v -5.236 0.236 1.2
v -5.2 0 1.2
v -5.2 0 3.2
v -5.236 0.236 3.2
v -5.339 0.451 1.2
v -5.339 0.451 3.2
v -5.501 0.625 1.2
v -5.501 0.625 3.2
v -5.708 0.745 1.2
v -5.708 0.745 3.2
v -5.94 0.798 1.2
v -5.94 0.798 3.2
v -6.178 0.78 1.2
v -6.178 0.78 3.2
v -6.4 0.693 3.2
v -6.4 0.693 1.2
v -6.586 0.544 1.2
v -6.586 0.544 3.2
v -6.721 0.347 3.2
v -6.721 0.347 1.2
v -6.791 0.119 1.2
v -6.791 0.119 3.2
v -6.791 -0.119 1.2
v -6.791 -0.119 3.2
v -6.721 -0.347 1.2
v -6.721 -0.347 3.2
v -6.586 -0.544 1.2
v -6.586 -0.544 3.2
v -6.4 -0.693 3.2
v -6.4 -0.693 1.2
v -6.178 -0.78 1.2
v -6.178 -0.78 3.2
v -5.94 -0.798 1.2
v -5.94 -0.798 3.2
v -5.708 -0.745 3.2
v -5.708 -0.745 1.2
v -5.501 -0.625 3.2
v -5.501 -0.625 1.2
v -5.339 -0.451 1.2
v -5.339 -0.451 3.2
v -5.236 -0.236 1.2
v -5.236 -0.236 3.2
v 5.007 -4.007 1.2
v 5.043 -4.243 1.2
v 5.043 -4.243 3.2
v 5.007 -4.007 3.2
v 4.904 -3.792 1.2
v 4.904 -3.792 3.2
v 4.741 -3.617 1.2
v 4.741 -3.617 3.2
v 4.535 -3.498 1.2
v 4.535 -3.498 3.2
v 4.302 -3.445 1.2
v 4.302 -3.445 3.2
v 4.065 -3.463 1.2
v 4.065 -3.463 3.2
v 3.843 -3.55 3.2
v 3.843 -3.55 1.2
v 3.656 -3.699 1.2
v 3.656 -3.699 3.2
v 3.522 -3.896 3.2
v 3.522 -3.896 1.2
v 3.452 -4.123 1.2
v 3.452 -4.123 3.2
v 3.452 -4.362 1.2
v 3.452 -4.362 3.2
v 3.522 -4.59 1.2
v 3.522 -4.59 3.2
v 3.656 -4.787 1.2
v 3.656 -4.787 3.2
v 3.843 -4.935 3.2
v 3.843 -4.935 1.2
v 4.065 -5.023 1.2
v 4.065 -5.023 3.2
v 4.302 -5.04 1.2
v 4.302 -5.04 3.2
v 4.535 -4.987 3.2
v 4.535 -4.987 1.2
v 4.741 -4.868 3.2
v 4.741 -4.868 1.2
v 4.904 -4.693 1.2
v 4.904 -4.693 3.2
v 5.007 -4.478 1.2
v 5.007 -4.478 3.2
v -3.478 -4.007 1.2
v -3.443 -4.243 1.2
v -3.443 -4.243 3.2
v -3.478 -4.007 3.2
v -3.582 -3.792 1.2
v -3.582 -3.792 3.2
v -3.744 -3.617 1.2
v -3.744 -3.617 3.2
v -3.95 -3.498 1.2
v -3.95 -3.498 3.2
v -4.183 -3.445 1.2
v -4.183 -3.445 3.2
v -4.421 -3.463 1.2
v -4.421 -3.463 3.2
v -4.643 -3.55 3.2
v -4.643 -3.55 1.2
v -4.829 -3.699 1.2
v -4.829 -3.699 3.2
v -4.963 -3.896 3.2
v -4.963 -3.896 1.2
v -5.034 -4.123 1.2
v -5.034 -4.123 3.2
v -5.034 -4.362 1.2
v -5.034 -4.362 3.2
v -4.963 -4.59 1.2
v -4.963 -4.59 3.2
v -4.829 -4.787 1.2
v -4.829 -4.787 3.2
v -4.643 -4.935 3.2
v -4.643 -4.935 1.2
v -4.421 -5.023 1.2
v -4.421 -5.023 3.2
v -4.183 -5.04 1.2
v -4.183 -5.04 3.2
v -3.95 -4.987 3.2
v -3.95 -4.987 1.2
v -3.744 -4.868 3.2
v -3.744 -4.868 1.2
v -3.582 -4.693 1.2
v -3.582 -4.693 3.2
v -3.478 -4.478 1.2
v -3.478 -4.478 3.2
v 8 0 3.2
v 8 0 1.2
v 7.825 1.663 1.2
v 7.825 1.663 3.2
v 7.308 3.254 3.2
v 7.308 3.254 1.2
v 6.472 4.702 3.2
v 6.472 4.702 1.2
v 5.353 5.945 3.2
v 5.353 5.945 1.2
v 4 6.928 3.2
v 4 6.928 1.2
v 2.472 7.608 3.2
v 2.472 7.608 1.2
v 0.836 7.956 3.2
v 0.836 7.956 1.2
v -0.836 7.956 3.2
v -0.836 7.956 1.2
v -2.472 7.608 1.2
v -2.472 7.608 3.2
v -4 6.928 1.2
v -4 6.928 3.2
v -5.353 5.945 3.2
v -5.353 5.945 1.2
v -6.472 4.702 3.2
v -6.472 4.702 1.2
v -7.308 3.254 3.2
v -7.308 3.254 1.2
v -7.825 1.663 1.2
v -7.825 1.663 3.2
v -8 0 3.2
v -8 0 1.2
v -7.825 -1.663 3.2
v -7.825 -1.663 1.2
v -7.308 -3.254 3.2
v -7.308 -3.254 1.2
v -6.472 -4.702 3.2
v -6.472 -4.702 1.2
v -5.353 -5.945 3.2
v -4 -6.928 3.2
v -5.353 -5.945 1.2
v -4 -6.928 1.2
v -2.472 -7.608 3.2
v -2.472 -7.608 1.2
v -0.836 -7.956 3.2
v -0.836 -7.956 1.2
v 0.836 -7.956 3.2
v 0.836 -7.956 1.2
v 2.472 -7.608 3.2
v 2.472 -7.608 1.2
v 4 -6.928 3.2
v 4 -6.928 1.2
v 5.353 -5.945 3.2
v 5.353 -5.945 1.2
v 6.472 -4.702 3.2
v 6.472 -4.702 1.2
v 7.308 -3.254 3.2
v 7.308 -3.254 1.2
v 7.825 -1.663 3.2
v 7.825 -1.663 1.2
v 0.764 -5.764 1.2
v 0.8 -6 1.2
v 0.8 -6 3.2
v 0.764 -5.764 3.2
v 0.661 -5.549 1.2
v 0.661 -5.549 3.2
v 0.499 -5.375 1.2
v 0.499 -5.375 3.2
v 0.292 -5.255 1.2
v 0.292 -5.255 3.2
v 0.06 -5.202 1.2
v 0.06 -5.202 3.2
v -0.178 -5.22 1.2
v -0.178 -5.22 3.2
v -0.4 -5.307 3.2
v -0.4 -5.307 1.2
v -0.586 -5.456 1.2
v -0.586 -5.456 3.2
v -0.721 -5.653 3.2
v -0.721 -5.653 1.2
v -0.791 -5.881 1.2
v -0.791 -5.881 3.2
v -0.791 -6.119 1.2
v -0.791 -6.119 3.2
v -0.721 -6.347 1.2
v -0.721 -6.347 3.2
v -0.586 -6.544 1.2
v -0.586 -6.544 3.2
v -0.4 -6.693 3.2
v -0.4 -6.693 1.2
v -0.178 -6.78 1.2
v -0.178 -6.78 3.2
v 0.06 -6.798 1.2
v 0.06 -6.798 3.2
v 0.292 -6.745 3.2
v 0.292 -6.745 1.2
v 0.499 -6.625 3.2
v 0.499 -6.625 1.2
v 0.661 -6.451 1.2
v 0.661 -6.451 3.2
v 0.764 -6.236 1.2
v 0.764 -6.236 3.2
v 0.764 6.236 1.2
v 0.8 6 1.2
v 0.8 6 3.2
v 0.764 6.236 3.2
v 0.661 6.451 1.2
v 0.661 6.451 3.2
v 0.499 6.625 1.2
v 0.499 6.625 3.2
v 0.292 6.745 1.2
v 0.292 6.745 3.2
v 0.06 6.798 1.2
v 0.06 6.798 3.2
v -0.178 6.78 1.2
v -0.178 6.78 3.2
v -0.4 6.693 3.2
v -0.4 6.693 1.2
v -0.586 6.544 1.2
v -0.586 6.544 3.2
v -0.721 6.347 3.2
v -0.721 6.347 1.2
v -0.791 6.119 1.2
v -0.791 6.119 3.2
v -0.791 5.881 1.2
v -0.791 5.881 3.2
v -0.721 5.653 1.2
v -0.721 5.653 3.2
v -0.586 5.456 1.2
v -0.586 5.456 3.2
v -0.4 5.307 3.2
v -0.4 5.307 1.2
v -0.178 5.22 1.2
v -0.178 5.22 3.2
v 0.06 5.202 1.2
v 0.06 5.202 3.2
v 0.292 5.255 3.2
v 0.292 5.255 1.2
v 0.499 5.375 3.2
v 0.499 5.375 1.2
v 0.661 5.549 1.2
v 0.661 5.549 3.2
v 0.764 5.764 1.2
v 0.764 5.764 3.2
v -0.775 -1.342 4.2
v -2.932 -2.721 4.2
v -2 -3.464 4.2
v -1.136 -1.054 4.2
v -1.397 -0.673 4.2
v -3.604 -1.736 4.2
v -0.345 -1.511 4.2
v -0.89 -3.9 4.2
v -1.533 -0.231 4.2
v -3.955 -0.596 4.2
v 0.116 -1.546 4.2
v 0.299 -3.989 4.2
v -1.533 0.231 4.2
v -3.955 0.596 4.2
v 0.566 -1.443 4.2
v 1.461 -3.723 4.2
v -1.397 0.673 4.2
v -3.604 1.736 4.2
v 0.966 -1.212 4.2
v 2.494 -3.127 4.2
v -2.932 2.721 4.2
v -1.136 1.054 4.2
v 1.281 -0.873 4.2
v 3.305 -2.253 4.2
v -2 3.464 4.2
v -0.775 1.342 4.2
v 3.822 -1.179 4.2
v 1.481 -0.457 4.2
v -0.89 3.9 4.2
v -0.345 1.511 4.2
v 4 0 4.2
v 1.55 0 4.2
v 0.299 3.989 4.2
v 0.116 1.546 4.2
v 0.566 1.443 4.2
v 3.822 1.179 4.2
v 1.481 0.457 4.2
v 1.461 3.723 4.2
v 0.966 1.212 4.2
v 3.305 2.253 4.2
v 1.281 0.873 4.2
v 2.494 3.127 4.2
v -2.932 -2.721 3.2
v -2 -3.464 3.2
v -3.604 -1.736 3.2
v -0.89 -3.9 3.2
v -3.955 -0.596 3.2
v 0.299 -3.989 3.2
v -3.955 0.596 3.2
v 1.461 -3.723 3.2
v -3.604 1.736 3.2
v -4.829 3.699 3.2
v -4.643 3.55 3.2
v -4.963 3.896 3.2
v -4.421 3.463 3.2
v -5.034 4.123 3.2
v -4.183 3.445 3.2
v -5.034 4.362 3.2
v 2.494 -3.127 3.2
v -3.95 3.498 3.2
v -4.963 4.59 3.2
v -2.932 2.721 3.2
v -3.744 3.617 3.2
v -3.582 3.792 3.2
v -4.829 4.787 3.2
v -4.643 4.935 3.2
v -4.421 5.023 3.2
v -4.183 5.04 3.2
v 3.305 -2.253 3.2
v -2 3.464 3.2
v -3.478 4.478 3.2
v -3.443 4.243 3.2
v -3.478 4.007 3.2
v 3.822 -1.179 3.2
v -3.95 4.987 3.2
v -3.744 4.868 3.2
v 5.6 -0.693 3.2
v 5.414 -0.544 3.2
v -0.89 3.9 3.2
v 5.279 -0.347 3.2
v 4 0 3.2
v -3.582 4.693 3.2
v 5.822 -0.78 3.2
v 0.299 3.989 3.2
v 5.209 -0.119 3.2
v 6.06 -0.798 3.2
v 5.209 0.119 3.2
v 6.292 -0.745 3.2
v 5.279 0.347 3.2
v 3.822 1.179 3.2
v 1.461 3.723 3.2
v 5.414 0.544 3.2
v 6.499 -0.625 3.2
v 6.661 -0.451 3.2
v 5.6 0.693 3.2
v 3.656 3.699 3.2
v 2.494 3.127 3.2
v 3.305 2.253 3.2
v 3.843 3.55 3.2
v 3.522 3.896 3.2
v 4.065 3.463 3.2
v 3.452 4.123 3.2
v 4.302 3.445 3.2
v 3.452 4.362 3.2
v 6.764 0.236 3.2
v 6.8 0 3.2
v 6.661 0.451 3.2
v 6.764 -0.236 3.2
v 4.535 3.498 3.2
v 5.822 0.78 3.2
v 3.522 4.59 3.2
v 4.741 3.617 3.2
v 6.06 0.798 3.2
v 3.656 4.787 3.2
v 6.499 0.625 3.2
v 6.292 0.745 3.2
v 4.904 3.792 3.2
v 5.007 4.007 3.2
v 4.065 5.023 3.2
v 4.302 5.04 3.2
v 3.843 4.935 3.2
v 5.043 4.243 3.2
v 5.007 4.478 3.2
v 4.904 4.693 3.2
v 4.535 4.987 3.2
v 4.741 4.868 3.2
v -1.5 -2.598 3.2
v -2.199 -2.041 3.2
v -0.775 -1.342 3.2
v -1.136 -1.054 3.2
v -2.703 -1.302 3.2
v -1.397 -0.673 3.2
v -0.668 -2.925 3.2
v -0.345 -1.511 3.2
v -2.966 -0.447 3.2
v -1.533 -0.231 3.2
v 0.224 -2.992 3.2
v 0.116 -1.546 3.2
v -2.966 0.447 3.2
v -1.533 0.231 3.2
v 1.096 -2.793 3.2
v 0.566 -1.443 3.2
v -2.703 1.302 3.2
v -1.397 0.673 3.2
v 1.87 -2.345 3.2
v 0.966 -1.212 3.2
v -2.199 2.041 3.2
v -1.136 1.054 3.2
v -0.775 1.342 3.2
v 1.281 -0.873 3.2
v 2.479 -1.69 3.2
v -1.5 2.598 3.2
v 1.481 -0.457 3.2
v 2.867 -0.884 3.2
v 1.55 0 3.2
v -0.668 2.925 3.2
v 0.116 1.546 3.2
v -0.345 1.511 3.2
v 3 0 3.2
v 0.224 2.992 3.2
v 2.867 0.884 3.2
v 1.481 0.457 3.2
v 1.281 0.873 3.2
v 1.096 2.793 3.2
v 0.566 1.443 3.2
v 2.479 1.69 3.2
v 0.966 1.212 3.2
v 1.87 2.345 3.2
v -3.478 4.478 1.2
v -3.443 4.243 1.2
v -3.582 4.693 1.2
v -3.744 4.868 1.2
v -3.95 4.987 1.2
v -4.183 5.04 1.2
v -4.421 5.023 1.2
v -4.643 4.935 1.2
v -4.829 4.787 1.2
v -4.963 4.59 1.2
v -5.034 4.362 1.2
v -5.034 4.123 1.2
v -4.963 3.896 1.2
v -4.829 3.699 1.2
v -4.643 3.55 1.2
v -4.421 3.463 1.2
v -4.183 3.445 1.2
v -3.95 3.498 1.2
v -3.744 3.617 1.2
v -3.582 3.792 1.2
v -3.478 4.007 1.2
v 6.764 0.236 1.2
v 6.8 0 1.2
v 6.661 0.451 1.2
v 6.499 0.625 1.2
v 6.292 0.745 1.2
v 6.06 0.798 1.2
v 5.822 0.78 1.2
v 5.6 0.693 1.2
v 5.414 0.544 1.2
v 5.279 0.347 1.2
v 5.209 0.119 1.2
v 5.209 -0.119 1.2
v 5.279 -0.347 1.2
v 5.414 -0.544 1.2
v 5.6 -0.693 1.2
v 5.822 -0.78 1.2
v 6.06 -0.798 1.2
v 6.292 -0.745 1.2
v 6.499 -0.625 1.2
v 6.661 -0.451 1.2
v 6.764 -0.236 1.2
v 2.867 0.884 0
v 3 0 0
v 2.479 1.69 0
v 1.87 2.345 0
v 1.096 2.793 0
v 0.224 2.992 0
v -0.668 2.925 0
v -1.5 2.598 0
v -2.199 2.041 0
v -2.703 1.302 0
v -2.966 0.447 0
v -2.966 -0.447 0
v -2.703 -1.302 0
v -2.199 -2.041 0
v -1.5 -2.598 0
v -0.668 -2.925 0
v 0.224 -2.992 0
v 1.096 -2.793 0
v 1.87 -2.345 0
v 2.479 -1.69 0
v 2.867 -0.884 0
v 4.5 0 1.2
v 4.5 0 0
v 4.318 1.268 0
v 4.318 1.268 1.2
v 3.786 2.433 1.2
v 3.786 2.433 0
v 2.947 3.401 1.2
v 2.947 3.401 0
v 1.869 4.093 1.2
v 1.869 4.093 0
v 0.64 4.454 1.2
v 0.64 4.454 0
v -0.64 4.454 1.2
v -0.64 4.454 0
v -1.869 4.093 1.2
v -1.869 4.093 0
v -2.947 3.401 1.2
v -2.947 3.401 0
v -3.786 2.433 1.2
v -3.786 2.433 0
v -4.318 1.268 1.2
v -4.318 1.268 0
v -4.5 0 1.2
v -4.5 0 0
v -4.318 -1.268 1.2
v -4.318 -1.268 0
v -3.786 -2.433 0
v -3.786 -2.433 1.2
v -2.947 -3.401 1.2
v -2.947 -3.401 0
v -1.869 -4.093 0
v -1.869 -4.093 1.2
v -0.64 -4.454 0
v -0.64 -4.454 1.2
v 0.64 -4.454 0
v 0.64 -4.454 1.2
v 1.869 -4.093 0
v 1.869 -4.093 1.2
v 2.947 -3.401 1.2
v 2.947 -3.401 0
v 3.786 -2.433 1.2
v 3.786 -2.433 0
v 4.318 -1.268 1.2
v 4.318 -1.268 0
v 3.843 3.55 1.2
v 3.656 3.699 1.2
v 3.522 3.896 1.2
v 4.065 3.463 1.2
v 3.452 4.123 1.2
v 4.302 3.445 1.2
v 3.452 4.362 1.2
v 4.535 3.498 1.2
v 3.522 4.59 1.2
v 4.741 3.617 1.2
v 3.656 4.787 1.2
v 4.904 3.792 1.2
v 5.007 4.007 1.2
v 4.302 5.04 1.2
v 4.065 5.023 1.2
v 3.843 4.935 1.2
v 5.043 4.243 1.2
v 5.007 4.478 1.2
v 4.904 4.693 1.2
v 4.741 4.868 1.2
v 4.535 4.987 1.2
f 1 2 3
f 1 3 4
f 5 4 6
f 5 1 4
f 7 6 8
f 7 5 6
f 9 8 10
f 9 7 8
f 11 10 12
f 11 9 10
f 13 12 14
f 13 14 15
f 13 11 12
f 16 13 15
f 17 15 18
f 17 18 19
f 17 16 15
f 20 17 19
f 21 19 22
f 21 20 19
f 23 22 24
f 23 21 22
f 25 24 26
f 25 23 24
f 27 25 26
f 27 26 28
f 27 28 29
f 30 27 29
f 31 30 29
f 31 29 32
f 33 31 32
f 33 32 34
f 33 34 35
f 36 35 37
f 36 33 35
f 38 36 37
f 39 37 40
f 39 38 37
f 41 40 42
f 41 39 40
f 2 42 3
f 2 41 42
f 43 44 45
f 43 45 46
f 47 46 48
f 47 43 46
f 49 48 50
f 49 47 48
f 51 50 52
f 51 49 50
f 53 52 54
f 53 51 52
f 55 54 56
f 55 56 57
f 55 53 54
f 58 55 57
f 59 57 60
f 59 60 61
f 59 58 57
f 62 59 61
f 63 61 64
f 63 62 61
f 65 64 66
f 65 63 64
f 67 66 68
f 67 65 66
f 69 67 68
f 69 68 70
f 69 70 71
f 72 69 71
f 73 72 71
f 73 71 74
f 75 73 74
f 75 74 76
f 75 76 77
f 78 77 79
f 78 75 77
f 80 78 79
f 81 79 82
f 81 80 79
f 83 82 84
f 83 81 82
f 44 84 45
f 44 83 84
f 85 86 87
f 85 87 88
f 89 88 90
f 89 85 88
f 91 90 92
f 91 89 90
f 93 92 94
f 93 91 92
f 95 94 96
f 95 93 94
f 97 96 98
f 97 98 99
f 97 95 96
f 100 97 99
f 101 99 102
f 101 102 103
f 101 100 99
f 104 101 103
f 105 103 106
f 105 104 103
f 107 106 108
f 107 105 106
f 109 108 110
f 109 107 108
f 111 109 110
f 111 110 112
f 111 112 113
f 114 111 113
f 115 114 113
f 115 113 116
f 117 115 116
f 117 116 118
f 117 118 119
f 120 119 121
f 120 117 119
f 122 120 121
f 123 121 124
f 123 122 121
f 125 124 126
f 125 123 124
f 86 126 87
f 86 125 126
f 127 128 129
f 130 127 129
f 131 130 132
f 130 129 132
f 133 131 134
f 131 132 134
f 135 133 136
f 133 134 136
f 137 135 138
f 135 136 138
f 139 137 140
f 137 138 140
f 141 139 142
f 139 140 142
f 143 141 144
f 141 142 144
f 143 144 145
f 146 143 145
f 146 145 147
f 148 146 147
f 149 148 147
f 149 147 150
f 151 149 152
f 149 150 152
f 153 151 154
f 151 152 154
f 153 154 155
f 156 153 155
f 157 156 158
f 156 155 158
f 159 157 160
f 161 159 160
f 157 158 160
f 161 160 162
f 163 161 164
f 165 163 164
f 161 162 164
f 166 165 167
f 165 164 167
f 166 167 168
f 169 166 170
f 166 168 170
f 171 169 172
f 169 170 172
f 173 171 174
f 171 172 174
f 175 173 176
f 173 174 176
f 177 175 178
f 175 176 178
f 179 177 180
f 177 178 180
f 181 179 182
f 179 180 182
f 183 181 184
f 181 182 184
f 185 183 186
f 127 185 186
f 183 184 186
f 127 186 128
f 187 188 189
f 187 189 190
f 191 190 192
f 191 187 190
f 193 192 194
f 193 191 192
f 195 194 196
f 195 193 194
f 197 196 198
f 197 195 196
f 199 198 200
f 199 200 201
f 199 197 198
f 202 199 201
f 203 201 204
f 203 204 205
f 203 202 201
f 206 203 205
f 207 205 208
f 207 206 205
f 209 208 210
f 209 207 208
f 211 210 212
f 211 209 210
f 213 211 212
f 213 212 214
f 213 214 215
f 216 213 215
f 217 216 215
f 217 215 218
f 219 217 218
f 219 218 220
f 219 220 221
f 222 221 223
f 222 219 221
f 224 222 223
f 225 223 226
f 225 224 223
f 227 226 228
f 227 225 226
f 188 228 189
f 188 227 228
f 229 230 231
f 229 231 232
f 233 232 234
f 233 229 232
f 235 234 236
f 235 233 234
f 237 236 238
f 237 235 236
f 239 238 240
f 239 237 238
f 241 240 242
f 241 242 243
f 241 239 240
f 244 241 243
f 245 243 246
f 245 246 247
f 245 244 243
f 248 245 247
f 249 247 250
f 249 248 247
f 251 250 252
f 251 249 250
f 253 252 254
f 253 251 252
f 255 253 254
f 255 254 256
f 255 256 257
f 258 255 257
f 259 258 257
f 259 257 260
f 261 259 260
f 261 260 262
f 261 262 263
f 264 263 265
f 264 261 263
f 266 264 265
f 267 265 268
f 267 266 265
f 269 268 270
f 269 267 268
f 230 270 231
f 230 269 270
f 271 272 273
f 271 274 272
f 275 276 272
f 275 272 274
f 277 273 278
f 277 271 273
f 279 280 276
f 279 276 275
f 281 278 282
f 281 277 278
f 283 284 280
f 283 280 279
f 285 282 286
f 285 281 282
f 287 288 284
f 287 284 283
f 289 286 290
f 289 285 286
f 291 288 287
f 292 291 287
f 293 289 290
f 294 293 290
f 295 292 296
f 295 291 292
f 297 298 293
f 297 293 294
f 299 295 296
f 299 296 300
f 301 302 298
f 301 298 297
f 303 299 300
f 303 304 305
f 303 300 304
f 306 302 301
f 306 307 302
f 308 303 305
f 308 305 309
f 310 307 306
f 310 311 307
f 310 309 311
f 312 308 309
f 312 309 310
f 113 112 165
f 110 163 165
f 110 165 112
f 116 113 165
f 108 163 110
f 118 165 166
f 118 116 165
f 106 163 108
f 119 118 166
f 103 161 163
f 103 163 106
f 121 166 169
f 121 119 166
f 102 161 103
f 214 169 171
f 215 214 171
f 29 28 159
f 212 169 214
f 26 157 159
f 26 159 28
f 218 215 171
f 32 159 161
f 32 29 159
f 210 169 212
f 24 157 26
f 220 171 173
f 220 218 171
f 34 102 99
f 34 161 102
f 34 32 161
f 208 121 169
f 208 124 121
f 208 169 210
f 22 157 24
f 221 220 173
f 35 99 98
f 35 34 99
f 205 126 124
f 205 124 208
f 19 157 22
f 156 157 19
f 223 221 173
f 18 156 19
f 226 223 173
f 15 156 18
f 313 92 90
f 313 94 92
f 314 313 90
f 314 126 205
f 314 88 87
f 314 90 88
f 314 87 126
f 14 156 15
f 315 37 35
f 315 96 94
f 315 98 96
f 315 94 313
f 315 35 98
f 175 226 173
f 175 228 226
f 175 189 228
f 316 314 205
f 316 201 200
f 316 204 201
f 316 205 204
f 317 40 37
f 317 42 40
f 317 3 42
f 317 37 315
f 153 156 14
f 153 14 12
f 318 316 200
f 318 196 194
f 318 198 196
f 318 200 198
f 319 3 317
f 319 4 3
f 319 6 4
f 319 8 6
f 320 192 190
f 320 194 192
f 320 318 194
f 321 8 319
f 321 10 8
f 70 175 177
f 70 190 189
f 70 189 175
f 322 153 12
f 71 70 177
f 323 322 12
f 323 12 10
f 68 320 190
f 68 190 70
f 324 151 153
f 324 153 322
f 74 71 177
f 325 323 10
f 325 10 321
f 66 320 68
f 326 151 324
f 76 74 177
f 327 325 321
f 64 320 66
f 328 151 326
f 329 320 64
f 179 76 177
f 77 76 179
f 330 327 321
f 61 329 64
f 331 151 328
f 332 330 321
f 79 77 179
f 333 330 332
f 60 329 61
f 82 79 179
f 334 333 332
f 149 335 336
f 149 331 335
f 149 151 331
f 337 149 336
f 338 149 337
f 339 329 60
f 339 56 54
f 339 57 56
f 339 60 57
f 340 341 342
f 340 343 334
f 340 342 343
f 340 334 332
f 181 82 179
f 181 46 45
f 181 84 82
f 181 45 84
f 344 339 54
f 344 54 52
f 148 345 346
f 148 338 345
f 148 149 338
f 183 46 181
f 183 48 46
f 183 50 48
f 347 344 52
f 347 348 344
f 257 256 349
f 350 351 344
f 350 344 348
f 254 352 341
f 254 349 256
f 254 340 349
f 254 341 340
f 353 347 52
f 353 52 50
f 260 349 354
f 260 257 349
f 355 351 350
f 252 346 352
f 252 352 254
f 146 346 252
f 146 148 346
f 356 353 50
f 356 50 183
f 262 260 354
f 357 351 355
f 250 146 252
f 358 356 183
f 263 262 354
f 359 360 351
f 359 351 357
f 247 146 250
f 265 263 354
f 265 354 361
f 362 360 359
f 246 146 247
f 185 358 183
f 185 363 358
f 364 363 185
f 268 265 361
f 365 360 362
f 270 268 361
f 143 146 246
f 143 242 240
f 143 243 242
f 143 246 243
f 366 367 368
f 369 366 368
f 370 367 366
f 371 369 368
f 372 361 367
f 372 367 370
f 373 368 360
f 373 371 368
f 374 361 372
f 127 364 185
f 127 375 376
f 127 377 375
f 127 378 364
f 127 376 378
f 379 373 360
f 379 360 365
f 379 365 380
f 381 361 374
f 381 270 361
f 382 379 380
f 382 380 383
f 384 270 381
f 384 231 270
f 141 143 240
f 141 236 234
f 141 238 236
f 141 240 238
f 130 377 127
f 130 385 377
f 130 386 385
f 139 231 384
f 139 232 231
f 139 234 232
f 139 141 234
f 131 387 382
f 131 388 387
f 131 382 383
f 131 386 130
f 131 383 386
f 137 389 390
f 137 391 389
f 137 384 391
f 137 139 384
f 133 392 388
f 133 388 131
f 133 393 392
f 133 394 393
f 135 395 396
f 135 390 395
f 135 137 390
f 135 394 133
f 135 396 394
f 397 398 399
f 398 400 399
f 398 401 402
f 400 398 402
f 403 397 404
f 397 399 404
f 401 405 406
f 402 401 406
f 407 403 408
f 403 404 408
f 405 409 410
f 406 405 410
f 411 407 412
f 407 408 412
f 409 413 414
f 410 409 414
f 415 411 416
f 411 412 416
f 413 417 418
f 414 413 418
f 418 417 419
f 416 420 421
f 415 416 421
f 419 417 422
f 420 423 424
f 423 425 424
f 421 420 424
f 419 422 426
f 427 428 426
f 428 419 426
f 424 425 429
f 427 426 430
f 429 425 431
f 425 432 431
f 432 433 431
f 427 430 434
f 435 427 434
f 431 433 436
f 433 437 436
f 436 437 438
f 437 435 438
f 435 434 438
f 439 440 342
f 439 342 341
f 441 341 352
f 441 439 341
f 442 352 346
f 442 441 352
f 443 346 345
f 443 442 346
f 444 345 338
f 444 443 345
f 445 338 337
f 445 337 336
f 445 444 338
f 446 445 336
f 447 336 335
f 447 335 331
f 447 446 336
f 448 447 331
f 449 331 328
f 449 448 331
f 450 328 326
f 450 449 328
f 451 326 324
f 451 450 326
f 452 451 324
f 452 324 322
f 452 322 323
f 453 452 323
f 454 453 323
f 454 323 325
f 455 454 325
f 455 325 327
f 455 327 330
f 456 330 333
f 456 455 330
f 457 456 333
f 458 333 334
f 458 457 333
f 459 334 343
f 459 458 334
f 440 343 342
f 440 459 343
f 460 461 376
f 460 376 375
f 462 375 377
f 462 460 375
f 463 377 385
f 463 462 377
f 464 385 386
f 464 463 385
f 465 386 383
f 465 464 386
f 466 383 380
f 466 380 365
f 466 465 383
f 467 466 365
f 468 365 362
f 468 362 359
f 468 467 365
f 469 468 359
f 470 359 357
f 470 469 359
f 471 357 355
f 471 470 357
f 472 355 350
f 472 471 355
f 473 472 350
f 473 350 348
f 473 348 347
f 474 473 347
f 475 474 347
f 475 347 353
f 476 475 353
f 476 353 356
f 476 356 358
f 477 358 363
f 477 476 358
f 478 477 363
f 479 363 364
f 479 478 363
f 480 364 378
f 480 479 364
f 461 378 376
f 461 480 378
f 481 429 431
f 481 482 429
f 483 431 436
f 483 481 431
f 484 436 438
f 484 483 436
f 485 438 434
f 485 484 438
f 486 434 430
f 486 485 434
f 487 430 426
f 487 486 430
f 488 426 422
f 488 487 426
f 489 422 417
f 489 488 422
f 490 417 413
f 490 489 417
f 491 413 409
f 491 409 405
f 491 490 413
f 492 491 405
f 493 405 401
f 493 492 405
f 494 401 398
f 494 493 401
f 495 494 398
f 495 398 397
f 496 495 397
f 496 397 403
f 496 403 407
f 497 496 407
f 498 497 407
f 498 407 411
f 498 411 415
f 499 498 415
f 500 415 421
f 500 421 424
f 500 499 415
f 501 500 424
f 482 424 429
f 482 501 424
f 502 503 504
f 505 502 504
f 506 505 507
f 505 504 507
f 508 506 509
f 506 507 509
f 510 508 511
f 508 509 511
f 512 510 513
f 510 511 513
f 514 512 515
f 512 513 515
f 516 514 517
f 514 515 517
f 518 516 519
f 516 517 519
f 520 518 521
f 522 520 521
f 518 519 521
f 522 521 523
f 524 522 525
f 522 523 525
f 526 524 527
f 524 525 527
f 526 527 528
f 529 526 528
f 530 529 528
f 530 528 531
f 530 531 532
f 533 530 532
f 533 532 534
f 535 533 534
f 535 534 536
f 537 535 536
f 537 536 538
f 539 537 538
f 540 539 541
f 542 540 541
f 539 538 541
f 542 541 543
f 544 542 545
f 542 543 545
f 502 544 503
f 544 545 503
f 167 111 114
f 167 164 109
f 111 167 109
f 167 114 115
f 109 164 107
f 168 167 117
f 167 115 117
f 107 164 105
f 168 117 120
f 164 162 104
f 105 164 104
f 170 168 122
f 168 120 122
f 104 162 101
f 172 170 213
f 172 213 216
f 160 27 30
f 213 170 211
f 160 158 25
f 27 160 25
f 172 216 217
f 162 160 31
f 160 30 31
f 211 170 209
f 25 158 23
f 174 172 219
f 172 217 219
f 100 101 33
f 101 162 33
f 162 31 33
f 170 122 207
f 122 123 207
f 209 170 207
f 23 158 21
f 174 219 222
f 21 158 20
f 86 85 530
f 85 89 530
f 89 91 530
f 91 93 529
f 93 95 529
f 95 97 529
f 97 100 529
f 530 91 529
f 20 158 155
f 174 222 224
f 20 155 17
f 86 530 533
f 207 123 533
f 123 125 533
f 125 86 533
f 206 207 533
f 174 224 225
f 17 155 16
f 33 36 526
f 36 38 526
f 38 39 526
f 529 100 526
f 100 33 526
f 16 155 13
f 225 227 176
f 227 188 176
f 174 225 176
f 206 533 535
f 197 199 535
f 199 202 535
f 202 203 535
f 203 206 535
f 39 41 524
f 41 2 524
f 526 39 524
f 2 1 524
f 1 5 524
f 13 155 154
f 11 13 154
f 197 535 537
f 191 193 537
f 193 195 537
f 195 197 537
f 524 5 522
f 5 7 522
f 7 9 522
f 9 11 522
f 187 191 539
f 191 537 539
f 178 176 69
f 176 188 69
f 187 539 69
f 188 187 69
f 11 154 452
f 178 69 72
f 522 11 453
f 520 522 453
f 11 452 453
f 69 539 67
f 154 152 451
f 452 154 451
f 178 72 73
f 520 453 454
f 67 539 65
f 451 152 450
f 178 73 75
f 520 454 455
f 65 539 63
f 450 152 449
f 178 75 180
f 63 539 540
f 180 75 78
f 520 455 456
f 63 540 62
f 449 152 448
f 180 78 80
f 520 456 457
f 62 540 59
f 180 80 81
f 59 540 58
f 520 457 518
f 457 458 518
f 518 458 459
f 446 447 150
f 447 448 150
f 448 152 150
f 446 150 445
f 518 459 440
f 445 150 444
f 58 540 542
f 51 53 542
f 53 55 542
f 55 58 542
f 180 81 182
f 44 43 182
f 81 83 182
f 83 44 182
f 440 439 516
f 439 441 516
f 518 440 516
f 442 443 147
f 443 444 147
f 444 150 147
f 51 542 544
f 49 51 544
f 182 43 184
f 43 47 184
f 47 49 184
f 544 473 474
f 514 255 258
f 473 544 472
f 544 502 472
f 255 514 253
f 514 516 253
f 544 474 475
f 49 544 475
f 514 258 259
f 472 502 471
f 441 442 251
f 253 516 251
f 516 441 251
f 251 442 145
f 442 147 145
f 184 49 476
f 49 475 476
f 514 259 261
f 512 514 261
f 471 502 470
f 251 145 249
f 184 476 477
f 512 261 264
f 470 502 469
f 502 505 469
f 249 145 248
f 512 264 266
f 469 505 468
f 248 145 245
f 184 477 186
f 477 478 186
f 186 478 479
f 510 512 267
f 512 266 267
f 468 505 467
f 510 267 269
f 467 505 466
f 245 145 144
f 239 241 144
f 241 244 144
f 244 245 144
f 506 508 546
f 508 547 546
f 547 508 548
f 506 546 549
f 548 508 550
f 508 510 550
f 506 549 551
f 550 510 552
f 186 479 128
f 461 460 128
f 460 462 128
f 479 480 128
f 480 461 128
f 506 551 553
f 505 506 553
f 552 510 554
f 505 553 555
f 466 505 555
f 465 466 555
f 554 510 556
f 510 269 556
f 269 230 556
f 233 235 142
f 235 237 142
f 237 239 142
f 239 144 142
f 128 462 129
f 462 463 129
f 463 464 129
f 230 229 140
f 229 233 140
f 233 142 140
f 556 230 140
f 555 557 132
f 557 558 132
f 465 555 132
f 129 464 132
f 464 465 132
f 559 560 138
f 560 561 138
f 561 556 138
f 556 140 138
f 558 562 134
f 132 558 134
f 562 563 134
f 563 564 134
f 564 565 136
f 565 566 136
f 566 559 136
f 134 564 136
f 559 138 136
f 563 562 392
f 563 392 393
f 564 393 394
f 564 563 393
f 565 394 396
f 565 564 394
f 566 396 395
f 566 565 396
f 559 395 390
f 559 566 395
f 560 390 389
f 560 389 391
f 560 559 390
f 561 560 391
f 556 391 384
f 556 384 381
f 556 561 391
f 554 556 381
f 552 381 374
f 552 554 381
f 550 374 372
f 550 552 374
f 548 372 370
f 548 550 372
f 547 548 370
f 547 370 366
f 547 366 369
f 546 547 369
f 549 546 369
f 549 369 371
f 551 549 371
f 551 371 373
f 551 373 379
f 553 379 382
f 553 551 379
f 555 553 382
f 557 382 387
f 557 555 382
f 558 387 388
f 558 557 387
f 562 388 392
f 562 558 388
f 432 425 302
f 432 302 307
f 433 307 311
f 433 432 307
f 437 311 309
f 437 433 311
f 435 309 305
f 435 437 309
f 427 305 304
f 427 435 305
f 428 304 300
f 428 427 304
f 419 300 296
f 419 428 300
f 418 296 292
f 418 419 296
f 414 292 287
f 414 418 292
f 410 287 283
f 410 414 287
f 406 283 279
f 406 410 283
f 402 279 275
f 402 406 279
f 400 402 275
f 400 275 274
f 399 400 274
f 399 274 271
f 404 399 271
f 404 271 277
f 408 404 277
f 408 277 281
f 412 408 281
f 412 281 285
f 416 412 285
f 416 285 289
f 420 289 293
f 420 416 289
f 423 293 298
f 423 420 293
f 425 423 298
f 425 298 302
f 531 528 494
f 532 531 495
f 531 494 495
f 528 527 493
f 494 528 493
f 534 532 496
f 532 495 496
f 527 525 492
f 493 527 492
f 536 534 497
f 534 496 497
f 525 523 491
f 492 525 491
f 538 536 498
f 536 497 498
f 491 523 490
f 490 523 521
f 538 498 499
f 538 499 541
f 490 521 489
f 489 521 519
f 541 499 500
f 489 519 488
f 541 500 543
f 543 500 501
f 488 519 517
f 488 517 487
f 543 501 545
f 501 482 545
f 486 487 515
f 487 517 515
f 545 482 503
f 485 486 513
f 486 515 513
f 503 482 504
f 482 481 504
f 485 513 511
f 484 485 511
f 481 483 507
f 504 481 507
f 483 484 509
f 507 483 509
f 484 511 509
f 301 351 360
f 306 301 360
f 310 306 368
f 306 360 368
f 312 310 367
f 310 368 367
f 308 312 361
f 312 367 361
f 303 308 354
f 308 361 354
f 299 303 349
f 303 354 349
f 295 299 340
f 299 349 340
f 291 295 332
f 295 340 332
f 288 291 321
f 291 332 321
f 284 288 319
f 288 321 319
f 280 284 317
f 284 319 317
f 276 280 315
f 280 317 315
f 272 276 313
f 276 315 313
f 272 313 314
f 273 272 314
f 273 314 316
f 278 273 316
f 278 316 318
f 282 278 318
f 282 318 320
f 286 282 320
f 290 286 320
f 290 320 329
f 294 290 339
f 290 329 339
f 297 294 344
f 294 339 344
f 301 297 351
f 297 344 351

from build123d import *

# Parameters (mm, degrees)
F0_R     = 4.5
F0_R_2   = 3
F1_DEPTH = 1.2
F2_R     = 8
F2_R_2   = 0.8
F2_R_3   = 4.5
F2_R_4   = 3
F3_DEPTH = 2
F4_R     = 4
F4_R_2   = 1.55
F5_DEPTH = 1


with BuildPart() as f1:
    # F0 (on Top) → F1 (new body)
    with BuildSketch(Plane.XY):
        Circle(F0_R)
        Circle(F0_R_2, mode=Mode.SUBTRACT)
    extrude(amount=F1_DEPTH)

    # F2 (on face) → F3 (join)
    with BuildSketch(Plane.XY.offset(1.2)):
        Circle(F2_R)
        with Locations((-4.2426406871, -4.2426406871)):
            Circle(F2_R_2, mode=Mode.SUBTRACT)
        with Locations((0, -6)):
            Circle(F2_R_2, mode=Mode.SUBTRACT)
        with Locations((4.2426406871, -4.2426406871)):
            Circle(F2_R_2, mode=Mode.SUBTRACT)
        with Locations((-6, 0)):
            Circle(F2_R_2, mode=Mode.SUBTRACT)
        with Locations((-4.2426406871, 4.2426406871)):
            Circle(F2_R_2, mode=Mode.SUBTRACT)
        Circle(F2_R_3, mode=Mode.SUBTRACT)
        with Locations((6, 0)):
            Circle(F2_R_2, mode=Mode.SUBTRACT)
        with Locations((0, 6)):
            Circle(F2_R_2, mode=Mode.SUBTRACT)
        with Locations((4.2426406871, 4.2426406871)):
            Circle(F2_R_2, mode=Mode.SUBTRACT)
        Circle(F2_R_3)
        Circle(F2_R_4, mode=Mode.SUBTRACT)
    extrude(amount=F3_DEPTH)

    # F4 (on face) → F5 (join)
    with BuildSketch(Plane.XY.offset(3.2)):
        Circle(F4_R)
        Circle(F4_R_2, mode=Mode.SUBTRACT)
    extrude(amount=F5_DEPTH)


solid = f1.part
